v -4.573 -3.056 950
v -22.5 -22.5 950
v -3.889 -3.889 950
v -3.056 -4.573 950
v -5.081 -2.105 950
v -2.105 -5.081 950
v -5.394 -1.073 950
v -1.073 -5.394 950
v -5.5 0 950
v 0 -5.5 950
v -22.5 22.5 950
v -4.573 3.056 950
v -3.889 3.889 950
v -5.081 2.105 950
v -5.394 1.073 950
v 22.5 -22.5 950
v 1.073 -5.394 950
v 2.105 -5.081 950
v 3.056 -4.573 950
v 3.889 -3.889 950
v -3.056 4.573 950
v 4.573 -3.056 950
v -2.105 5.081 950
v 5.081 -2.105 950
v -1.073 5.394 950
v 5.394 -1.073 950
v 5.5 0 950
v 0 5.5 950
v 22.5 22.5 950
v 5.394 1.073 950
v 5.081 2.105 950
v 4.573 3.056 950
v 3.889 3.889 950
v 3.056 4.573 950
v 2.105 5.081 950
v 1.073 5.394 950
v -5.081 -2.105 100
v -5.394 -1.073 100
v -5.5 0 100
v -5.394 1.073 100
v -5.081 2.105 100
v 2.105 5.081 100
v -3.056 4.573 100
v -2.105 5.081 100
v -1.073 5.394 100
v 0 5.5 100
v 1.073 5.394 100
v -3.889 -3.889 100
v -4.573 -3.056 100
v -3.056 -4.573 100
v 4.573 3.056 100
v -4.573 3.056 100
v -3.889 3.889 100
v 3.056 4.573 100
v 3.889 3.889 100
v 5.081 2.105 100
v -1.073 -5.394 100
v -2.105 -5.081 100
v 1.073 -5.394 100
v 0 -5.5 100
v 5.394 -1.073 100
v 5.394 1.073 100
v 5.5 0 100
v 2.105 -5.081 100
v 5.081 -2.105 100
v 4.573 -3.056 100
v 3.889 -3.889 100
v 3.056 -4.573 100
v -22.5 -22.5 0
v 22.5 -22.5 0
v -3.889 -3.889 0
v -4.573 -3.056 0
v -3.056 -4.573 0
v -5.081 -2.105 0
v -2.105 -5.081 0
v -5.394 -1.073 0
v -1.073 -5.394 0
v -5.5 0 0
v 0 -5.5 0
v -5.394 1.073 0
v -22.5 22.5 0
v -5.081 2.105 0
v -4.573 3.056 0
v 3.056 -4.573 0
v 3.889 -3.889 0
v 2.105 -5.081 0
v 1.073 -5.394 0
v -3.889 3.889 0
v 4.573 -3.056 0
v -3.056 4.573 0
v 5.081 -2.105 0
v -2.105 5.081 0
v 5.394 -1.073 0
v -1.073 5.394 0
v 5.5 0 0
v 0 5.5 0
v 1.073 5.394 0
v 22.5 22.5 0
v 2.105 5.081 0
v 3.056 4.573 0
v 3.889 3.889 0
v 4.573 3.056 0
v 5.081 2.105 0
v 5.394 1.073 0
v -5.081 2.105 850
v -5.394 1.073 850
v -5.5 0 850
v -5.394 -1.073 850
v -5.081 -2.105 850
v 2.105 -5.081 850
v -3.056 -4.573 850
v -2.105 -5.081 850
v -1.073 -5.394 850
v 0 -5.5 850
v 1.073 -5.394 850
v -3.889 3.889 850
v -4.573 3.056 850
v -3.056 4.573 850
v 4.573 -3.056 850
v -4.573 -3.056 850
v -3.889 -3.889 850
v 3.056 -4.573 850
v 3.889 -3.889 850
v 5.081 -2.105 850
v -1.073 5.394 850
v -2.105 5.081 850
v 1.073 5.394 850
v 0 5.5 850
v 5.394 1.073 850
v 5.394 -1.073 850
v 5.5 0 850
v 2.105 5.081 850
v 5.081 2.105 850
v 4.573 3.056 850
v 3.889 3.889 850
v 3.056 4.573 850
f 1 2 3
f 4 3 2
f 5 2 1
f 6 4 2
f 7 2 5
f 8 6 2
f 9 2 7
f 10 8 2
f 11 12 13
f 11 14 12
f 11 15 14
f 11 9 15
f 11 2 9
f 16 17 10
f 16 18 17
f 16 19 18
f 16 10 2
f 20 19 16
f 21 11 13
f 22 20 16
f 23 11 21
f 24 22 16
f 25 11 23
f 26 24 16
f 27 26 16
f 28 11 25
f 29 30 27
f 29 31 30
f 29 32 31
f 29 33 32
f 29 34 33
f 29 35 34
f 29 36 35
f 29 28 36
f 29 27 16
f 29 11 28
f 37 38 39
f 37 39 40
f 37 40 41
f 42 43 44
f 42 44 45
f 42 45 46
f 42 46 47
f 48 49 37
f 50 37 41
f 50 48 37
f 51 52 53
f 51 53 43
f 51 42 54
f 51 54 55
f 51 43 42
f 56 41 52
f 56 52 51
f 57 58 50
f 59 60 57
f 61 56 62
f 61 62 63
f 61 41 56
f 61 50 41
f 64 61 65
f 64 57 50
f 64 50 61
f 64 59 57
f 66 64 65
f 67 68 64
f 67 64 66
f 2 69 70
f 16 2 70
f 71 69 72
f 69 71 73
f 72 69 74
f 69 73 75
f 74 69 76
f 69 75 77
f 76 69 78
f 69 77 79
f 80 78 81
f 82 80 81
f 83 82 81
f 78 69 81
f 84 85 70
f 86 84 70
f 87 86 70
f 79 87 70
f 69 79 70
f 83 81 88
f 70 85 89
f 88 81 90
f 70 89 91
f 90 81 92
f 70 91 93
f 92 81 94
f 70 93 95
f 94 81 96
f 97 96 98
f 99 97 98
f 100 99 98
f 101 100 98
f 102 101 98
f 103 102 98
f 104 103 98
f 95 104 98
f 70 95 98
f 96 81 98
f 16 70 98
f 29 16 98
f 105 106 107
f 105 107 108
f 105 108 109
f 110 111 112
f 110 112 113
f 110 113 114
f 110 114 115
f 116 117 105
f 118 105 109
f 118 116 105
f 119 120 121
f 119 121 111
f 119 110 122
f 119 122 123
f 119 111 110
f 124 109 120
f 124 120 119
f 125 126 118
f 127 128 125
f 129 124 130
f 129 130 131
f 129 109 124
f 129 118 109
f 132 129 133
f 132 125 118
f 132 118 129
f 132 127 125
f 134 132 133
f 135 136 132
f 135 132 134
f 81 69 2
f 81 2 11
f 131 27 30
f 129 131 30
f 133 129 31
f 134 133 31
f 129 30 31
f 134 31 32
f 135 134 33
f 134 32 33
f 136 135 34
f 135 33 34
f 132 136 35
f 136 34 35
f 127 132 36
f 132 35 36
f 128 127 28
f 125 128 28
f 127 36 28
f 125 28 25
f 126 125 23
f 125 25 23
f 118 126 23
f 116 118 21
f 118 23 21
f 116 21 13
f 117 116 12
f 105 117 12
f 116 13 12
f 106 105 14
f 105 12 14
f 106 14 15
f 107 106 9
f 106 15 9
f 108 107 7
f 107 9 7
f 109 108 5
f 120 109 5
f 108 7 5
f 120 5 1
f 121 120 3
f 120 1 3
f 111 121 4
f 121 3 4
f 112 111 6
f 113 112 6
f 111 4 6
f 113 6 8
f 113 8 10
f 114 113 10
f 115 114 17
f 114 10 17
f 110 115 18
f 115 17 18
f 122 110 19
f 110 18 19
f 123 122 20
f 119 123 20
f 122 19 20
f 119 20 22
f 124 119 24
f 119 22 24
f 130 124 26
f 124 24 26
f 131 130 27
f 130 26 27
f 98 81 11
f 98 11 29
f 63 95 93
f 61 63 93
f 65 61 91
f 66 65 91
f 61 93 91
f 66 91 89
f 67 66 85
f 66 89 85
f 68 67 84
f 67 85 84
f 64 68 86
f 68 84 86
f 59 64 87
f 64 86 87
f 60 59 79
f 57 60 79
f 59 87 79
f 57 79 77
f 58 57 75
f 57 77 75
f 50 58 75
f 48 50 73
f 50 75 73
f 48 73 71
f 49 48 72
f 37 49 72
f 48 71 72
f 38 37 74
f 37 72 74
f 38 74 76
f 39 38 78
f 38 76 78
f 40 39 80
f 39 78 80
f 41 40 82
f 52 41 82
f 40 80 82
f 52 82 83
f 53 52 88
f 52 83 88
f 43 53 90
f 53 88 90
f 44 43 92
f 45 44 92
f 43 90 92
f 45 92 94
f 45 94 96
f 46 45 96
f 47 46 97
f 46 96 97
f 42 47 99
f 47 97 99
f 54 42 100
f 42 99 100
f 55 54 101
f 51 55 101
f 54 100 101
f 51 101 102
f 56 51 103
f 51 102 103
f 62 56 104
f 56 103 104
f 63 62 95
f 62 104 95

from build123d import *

# Parameters (mm, degrees)
F0_W     = 45
F0_H     = 45
F1_DEPTH = 950
F3_R     = 5.5
F4_DEPTH = 100
F2_R     = 5.5
F5_DEPTH = 100


with BuildPart() as f1:
    # F0 (on Top) → F1 (new body)
    with BuildSketch(Plane.XY):
        Rectangle(F0_W, F0_H)
    extrude(amount=F1_DEPTH)

    # F3 (on face) → F4 (cut)
    with BuildSketch(Plane.XY.offset(950)):
        Circle(F3_R)
    extrude(amount=-F4_DEPTH, mode=Mode.SUBTRACT)

    # F2 (on face) → F5 (cut)
    with BuildSketch(Plane(origin=(0, 0, 0), x_dir=(1, 0, 0), z_dir=(0, 0, -1))):
        Circle(F2_R)
    extrude(amount=-F5_DEPTH, mode=Mode.SUBTRACT)


solid = f1.part
